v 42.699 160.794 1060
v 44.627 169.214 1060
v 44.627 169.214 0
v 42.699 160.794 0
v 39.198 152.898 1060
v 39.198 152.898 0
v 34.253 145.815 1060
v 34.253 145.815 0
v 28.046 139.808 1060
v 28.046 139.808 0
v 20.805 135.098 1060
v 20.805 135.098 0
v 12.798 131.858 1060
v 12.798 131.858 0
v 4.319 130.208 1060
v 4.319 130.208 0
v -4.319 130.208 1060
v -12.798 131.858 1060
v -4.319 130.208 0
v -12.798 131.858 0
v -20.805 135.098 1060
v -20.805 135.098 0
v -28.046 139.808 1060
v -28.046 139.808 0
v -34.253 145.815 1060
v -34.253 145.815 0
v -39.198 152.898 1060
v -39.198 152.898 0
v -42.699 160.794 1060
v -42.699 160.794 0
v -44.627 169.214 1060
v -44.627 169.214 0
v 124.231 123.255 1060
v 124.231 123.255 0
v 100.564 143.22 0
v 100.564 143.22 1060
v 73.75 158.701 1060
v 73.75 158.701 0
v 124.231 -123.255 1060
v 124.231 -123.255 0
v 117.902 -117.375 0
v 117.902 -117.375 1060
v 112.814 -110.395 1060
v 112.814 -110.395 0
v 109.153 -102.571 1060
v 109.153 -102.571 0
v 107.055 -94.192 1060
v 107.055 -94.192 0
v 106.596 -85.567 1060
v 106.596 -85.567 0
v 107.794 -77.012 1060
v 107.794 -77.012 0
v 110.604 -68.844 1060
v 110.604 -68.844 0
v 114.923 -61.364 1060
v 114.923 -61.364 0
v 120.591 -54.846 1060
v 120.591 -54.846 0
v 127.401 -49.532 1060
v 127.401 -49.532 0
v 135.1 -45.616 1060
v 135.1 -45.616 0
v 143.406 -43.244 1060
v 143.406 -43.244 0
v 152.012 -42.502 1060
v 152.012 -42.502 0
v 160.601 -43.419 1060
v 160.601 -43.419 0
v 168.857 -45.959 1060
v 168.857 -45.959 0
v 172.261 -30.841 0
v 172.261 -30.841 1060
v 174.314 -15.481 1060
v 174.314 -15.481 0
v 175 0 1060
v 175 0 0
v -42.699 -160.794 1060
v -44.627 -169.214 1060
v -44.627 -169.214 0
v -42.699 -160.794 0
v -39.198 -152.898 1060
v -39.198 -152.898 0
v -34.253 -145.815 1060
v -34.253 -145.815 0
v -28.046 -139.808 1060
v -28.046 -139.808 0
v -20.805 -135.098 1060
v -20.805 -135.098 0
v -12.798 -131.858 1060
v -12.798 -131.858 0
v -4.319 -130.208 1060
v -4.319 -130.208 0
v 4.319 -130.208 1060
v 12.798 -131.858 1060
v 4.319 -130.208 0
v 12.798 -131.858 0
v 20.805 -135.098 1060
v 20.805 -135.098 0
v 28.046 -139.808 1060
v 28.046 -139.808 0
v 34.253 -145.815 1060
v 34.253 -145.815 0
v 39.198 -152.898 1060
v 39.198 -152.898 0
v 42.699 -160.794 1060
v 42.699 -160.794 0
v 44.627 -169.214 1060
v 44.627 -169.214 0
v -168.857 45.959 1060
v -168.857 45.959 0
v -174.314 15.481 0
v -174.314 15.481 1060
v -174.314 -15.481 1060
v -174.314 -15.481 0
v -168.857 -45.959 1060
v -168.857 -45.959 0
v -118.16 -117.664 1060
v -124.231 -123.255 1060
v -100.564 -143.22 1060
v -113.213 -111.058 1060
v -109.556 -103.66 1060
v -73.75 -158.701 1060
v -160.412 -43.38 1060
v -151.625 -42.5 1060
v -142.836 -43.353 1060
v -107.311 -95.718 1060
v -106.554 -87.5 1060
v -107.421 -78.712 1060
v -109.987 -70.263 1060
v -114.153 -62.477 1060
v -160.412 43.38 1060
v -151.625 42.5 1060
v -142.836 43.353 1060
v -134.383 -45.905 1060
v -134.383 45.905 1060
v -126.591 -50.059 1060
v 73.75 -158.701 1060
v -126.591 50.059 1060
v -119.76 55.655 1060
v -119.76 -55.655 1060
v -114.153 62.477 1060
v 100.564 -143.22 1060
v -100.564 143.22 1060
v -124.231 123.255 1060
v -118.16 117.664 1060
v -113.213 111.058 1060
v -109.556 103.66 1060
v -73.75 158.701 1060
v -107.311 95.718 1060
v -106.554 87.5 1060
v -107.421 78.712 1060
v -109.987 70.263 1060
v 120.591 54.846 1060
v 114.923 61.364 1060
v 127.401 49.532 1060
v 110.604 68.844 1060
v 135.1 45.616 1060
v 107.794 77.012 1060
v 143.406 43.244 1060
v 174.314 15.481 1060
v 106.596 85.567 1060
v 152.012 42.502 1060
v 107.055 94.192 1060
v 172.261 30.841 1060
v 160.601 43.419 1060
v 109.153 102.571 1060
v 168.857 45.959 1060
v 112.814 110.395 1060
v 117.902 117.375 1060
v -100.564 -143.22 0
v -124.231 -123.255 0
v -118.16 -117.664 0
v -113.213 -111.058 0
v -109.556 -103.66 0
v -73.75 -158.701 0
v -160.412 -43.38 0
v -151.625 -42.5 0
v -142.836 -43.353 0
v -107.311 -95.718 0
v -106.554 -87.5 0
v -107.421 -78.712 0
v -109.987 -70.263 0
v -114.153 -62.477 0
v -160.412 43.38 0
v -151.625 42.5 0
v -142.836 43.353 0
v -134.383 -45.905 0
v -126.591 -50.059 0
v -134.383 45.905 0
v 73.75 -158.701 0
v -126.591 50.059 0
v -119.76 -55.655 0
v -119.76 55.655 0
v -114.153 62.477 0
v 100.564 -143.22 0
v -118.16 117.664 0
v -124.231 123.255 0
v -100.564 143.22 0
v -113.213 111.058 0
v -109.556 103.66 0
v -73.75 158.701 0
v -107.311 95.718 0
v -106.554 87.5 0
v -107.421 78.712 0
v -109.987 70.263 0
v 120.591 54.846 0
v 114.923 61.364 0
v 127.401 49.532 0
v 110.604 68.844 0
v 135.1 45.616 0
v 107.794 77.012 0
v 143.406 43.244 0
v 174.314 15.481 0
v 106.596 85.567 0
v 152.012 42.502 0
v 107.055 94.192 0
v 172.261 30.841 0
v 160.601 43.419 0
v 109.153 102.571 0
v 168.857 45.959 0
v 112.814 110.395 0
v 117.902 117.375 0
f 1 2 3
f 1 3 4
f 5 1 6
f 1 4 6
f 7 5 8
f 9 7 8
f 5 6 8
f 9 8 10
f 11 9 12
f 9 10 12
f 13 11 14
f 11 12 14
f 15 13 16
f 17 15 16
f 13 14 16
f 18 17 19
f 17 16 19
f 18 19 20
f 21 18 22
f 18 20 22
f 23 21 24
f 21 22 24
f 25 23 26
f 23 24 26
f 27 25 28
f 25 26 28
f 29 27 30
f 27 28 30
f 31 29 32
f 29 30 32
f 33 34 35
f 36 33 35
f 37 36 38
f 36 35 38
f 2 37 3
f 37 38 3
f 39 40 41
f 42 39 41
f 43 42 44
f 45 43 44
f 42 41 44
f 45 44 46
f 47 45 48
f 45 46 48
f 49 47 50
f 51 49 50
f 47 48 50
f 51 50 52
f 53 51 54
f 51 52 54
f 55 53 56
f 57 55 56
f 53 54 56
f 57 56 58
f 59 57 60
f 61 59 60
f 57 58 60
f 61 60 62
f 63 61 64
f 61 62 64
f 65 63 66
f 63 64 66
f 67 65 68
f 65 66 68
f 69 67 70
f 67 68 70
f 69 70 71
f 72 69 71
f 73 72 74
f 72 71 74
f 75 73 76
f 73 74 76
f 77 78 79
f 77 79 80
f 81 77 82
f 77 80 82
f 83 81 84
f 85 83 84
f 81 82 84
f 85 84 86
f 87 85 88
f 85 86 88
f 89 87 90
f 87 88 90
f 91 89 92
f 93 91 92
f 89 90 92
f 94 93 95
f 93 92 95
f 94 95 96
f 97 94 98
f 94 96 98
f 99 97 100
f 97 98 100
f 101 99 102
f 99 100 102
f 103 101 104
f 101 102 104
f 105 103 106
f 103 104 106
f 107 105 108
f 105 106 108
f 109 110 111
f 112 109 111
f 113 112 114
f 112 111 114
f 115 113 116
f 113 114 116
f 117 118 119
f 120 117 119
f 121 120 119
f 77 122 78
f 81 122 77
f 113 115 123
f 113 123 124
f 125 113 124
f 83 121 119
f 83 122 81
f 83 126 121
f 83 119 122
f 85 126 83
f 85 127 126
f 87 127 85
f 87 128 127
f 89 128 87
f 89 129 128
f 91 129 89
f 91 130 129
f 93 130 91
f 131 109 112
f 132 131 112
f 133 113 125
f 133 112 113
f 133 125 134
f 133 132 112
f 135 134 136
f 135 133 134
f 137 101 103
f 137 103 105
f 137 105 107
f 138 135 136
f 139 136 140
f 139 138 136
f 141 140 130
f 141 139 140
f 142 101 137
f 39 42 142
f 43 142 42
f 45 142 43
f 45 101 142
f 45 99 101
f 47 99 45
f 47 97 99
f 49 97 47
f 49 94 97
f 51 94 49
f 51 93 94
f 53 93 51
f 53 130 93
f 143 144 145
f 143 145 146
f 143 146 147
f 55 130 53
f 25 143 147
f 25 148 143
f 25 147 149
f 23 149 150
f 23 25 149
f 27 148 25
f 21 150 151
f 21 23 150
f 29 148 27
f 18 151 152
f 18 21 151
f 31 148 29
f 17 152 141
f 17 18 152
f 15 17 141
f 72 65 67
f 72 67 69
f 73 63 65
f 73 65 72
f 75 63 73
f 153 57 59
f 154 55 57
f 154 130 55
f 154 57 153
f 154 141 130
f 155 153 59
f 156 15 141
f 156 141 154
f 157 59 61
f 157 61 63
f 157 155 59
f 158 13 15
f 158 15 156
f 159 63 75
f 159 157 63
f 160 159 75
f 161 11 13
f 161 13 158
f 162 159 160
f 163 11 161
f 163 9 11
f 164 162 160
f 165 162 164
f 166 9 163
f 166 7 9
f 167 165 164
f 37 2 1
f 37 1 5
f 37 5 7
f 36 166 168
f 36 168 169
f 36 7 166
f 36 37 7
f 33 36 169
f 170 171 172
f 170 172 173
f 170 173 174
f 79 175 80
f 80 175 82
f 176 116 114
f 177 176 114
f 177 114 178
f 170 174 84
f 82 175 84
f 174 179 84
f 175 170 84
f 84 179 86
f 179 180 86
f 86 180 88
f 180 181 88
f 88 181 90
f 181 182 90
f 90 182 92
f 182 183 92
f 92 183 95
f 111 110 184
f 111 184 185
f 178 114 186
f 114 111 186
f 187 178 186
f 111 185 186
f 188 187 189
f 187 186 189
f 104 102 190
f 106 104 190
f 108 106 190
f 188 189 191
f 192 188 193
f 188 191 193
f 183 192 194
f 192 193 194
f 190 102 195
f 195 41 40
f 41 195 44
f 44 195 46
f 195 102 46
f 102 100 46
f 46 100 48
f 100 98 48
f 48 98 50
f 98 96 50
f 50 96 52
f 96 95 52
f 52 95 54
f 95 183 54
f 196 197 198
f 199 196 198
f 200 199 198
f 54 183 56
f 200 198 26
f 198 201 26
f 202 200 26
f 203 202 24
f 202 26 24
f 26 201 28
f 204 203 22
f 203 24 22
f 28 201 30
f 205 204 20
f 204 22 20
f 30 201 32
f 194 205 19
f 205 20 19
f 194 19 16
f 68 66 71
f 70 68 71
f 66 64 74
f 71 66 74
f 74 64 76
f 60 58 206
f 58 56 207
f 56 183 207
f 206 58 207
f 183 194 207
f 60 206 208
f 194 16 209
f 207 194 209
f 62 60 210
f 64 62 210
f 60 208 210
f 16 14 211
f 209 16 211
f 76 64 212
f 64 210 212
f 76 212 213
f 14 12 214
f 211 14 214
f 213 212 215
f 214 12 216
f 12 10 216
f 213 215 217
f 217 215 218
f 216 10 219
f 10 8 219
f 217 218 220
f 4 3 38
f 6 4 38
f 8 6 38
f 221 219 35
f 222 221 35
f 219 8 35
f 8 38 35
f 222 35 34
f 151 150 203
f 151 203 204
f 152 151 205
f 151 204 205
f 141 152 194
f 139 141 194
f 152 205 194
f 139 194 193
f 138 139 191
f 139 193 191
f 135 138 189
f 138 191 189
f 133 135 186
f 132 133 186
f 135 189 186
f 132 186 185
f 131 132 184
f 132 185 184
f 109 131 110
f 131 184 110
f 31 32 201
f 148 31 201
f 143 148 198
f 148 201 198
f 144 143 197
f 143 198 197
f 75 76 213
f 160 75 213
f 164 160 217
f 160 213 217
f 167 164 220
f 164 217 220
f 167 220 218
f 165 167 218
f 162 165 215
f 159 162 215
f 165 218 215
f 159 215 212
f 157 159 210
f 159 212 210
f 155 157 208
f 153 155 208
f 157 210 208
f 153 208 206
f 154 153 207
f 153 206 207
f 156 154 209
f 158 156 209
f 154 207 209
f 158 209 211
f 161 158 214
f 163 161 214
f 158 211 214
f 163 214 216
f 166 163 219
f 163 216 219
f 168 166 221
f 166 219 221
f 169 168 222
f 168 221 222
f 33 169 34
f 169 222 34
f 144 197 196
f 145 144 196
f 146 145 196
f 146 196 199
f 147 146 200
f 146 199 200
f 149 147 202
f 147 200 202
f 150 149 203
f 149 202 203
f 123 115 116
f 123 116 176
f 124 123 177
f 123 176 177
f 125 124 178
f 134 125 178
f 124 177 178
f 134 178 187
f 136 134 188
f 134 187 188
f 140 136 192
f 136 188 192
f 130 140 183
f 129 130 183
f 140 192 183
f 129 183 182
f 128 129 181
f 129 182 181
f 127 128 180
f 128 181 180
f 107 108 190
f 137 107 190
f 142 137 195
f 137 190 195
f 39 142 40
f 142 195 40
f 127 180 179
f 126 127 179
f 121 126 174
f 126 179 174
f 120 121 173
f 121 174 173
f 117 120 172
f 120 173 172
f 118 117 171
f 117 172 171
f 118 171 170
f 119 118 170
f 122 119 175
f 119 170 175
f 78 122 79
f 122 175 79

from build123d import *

# Parameters (mm, degrees)
F1_DEPTH = 1060


with BuildPart() as f1:
    # F0 (on Top) → F1 (new body)
    with BuildSketch(Plane.XY):
        with BuildLine():
            ThreePointArc((168.857126, -45.95945), (173.457483, -23.184079), (175, 0))
            ThreePointArc((175, 0), (173.457483, 23.184079), (168.857126, 45.95945))
            ThreePointArc((168.857126, 45.95945), (112.583302, 65), (124.230614, 123.254835))
            ThreePointArc((124.230614, 123.254835), (87.5, 151.554446), (44.626511, 169.214286))
            ThreePointArc((44.626511, 169.214286), (0, 130), (-44.626511, 169.214286))
            ThreePointArc((-44.626511, 169.214286), (-87.5, 151.554446), (-124.230614, 123.254835))
            ThreePointArc((-124.230614, 123.254835), (-111.21481, 107.442763), (-106.554446, 87.5))
            ThreePointArc((-106.554446, 87.5), (-126.590678, 50.059243), (-168.857126, 45.95945))
            ThreePointArc((-168.857126, 45.95945), (-175, 0), (-168.857126, -45.95945))
            ThreePointArc((-168.857126, -45.95945), (-126.590678, -50.059243), (-106.554446, -87.5))
            ThreePointArc((-106.554446, -87.5), (-111.21481, -107.442763), (-124.230614, -123.254835))
            ThreePointArc((-124.230614, -123.254835), (-87.5, -151.554446), (-44.626511, -169.214286))
            ThreePointArc((-44.626511, -169.214286), (0, -130), (44.626511, -169.214286))
            ThreePointArc((44.626511, -169.214286), (87.5, -151.554446), (124.230614, -123.254835))
            ThreePointArc((124.230614, -123.254835), (112.583302, -65), (168.857126, -45.95945))
        make_face()
    extrude(amount=F1_DEPTH)


solid = f1.part
